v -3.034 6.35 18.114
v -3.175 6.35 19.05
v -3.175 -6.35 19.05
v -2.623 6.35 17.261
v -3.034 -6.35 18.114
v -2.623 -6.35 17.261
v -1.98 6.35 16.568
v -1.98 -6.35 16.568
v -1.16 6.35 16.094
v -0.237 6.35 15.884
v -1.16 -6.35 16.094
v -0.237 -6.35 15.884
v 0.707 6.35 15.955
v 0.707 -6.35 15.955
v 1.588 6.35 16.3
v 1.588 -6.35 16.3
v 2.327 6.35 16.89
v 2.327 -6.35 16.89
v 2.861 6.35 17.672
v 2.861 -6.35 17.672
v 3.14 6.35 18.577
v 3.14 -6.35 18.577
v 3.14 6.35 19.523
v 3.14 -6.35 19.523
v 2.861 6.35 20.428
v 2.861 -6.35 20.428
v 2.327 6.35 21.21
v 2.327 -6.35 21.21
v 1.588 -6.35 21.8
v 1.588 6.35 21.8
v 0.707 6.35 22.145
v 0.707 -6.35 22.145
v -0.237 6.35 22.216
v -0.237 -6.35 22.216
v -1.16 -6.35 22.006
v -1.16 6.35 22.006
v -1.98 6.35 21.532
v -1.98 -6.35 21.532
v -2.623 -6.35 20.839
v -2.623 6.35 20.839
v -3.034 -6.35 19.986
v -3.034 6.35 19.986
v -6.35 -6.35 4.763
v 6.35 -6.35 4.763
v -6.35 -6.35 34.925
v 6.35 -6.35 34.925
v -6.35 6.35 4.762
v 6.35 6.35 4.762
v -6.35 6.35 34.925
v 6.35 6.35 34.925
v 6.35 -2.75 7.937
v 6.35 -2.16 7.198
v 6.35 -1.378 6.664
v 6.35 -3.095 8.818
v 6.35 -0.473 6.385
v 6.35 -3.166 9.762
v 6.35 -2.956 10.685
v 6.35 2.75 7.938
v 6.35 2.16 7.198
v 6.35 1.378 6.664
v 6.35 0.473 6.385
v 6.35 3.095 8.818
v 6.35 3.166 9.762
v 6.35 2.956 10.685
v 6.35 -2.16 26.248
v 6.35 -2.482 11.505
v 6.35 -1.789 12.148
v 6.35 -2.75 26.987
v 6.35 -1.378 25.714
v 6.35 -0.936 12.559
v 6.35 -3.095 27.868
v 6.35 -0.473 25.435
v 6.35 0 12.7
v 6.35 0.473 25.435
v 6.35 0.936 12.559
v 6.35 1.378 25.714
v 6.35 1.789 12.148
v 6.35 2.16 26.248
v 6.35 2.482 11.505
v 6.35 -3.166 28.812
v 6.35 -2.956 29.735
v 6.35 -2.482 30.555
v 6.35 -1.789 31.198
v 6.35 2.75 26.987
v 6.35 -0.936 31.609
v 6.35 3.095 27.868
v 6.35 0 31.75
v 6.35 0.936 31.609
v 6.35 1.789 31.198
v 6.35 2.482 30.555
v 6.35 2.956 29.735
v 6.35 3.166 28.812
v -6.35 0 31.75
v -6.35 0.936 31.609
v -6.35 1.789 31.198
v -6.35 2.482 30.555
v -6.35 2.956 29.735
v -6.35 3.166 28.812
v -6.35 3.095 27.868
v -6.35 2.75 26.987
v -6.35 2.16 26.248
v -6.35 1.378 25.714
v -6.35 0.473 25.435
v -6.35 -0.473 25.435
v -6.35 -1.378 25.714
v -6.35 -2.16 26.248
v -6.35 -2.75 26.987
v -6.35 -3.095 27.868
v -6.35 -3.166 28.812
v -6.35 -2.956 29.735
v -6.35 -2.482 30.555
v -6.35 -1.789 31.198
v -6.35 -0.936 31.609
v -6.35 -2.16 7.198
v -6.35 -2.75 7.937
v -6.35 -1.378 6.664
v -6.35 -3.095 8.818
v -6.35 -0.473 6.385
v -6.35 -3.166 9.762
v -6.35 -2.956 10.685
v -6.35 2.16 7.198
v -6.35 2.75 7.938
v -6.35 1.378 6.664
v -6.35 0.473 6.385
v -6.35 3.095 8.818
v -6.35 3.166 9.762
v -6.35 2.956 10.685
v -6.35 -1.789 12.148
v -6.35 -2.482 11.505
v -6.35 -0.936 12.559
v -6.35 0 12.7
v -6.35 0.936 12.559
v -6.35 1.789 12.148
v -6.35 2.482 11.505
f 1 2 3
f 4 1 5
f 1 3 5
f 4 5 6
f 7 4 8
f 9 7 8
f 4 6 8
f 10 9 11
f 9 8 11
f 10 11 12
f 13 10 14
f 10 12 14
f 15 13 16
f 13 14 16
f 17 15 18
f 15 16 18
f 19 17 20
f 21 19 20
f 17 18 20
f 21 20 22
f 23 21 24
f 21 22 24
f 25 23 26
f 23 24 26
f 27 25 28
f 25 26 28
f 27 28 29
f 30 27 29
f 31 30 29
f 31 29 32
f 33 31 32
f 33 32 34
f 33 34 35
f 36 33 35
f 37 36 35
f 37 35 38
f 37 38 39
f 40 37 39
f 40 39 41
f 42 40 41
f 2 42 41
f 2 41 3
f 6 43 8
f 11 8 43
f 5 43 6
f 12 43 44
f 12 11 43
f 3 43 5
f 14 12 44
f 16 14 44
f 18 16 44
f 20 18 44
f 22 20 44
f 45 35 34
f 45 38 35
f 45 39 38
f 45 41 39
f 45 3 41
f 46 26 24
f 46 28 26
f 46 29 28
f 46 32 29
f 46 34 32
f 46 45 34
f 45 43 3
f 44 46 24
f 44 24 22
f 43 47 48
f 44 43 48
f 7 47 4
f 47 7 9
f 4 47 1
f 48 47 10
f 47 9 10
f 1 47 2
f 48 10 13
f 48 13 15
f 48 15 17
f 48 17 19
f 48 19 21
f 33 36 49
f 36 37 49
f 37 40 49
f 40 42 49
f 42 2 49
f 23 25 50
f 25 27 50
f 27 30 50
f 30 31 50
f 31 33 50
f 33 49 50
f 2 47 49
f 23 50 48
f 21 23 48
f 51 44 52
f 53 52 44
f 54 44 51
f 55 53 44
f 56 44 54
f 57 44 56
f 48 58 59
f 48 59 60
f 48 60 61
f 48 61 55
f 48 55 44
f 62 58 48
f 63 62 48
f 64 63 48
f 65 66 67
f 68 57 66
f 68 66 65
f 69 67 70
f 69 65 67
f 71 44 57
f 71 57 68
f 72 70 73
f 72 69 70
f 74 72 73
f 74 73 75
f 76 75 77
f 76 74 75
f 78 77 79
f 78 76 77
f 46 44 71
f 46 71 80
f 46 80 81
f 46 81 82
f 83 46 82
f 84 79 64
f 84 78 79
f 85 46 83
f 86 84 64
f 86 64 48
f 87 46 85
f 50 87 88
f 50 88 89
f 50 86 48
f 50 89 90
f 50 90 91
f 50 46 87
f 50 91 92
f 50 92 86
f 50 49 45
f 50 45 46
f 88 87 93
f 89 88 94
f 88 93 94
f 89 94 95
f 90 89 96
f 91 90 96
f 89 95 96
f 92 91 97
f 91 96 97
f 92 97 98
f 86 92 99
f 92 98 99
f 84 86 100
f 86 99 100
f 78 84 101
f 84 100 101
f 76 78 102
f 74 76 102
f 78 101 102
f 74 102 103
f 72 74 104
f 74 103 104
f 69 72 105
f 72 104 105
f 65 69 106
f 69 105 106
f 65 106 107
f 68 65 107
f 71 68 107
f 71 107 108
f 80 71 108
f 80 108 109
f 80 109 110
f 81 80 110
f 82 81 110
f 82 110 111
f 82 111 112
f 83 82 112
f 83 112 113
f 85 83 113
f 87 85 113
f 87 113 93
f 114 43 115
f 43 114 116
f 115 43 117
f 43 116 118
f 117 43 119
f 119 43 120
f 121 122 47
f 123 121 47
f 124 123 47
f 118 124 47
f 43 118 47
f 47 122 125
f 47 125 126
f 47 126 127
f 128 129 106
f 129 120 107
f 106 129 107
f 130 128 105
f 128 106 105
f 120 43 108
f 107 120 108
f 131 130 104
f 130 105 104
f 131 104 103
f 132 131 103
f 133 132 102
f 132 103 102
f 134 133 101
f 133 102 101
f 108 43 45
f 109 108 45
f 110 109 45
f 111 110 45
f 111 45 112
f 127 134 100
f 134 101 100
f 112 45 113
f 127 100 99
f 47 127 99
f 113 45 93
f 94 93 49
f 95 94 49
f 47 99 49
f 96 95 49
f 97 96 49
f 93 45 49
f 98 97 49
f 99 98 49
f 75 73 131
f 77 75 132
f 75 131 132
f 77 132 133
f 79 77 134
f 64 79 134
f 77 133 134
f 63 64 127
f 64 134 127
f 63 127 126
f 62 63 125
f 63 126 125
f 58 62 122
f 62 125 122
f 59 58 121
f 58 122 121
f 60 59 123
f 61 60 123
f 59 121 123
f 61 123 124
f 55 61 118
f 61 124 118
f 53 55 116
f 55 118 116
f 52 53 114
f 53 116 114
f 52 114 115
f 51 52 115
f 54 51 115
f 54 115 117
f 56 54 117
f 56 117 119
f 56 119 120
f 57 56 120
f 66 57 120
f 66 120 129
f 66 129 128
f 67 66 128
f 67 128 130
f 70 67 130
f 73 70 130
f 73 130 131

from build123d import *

# Parameters (mm, degrees)
SKETCH1_W               = 12.7
SKETCH1_H               = 12.7
BOSS_EXTRUDE1_DEPTH     = 34.925
F_1_4_20_TAPPED_HOLE1_D = 6.35
F_1_4_20_TAPPED_HOLE2_D = 6.35
SKETCH6_W               = 12.7
SKETCH6_H               = 39.6875
SKETCH6_R               = 3.175
CUT_EXTRUDE1_DEPTH      = 13.7


with BuildPart() as part:
    # Sketch1 → Boss-Extrude1 (new body, symmetric)
    with BuildSketch(Plane.XY):
        Rectangle(SKETCH1_W, SKETCH1_H)
    extrude(amount=BOSS_EXTRUDE1_DEPTH, both=True)

    # 1/4-20 Tapped Hole1 (through all)
    with Locations(Plane(origin=(0, 6.35, 0), x_dir=(1, 0, 0), z_dir=(0, 1, 0))):
        with Locations((0, 0), (0, 19.05), (0, -19.05)):
            Hole(F_1_4_20_TAPPED_HOLE1_D / 2)

    # 1/4-20 Tapped Hole2 (through all)
    with Locations(Plane(origin=(6.35, 0, 0), x_dir=(0, 0, -1), z_dir=(1, 0, 0))):
        with Locations((9.525, 0), (28.575, 0), (-9.525, 0), (-28.575, 0)):
            Hole(F_1_4_20_TAPPED_HOLE2_D / 2)

    # Sketch6 → Cut-Extrude1 (cut, through all)
    with BuildSketch(Plane(origin=(0, 6.35, 0), x_dir=(1, 0, 0), z_dir=(0, 1, 0))):
        with Locations((0, 15.08125)):
            Rectangle(SKETCH6_W, SKETCH6_H)
        Circle(SKETCH6_R, mode=Mode.SUBTRACT)
        with Locations((0, 19.05)):
            Circle(SKETCH6_R, mode=Mode.SUBTRACT)
    extrude(amount=-CUT_EXTRUDE1_DEPTH, mode=Mode.SUBTRACT)


solid = part.part
